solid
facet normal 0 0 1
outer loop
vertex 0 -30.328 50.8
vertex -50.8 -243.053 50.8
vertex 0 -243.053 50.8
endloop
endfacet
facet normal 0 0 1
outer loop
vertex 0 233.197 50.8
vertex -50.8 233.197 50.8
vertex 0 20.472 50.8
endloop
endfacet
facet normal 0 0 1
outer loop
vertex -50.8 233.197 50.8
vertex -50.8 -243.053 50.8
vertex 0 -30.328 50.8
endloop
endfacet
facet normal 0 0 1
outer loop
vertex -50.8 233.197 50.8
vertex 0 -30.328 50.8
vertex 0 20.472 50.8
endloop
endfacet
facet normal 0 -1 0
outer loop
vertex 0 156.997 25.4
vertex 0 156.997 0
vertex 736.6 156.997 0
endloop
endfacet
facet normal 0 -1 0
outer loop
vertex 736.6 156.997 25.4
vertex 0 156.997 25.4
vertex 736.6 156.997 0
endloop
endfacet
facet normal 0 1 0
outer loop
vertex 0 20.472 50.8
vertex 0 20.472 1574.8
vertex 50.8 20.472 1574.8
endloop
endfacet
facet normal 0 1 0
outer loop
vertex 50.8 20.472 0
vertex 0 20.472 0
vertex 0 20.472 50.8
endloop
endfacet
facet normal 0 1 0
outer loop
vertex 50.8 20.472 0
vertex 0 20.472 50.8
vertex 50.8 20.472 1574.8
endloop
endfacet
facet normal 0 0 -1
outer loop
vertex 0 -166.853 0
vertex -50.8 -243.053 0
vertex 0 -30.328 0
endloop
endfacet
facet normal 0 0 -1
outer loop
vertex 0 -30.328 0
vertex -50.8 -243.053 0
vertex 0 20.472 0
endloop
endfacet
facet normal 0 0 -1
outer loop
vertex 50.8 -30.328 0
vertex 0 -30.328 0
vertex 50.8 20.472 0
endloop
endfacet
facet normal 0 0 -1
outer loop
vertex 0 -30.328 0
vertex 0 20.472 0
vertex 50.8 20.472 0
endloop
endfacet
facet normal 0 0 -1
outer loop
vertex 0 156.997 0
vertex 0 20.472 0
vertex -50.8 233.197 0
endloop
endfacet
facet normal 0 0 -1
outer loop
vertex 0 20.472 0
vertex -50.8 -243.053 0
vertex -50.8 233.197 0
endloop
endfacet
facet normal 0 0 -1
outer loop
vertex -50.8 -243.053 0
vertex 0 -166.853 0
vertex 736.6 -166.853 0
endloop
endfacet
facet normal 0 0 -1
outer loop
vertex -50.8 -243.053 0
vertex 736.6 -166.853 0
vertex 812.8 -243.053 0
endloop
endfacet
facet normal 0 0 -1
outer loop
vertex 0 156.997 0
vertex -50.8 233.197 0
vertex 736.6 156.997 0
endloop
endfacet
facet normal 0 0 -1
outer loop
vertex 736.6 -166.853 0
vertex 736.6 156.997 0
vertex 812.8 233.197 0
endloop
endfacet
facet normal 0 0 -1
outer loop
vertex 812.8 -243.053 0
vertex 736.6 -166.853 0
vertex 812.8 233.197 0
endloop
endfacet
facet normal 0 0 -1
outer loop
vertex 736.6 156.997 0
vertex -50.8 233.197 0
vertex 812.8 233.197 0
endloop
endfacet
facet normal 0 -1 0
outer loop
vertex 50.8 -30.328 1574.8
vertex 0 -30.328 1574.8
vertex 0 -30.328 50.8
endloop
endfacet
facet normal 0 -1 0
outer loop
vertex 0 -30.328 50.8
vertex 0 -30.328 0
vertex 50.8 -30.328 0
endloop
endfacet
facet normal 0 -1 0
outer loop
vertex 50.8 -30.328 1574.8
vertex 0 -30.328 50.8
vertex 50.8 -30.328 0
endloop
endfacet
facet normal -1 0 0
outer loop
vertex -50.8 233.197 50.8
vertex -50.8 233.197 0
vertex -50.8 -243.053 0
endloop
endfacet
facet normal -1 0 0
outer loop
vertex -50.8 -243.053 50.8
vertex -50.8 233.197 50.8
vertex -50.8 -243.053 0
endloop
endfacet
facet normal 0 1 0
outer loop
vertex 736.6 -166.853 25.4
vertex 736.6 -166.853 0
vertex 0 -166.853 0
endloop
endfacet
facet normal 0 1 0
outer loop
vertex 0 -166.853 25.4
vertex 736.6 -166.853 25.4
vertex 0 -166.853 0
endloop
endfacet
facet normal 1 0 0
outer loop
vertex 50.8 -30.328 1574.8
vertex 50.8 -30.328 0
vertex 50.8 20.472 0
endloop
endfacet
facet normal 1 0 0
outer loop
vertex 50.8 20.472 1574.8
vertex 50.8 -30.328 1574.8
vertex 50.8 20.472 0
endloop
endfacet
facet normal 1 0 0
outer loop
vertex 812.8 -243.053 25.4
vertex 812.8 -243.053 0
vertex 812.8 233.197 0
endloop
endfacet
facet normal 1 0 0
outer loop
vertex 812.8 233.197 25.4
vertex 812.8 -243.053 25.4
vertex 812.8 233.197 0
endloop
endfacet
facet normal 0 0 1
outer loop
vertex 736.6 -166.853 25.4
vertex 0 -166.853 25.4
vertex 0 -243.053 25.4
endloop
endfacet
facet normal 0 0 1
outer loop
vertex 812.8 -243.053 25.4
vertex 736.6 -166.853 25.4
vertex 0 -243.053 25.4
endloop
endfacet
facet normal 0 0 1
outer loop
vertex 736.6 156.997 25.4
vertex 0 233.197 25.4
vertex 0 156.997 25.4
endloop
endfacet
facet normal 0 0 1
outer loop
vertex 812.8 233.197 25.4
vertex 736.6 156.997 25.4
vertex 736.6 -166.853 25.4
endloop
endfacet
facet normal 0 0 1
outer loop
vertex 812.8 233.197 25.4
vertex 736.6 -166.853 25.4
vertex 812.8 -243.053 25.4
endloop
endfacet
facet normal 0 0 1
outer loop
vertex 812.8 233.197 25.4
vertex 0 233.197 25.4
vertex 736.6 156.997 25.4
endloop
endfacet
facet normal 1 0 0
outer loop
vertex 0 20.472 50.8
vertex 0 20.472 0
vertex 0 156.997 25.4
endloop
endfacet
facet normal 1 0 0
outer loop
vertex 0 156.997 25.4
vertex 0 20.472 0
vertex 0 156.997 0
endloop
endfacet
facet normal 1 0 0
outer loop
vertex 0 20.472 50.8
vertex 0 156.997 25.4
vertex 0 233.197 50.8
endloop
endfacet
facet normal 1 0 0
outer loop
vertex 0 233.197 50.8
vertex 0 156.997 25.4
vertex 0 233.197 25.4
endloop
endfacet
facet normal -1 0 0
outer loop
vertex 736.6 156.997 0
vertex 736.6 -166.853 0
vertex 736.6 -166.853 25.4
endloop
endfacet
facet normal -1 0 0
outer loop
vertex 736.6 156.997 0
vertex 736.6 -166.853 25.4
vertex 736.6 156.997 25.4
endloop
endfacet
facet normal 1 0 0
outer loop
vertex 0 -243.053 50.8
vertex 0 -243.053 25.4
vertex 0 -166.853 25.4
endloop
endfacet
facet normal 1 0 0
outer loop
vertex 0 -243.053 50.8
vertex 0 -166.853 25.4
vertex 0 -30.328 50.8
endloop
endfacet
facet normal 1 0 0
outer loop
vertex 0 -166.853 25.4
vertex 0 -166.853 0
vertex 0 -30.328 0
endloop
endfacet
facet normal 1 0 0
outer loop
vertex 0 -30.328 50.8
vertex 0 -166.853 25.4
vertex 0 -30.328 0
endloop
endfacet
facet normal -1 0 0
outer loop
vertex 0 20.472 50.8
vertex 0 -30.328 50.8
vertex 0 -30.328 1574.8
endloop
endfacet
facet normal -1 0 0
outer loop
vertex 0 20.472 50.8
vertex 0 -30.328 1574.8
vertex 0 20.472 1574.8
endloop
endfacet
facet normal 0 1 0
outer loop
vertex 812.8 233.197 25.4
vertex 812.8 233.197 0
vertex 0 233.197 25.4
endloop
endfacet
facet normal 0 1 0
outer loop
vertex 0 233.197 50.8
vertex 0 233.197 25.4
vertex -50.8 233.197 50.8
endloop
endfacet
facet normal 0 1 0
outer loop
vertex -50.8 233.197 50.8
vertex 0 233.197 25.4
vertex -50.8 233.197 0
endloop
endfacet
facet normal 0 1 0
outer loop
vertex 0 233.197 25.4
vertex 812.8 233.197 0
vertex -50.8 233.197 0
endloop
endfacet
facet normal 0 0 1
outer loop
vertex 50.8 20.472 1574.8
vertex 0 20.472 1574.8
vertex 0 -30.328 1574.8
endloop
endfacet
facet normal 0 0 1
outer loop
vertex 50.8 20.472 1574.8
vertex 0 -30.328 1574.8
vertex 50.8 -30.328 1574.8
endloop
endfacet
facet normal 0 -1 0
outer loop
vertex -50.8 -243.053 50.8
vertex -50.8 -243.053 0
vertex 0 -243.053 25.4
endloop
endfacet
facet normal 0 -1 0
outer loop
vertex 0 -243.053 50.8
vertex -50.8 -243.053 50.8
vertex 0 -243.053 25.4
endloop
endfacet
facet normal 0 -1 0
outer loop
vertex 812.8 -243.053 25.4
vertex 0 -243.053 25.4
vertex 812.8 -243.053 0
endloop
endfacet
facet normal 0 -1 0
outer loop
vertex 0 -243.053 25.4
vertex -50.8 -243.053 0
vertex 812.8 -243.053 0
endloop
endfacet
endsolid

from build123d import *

# Parameters (mm, degrees)
F0_W     = 76.2
F0_H     = 323.85
F1_DEPTH = 25.4
F2_DEPTH = 50.8
F0_W_2   = 50.8
F0_H_2   = 50.8
F3_DEPTH = 1574.8


with BuildPart() as f1:
    # F0 (on Top) → F1 (new body)
    with BuildSketch(Plane.XY):
        Polygon((0, 233.196965), (0, 156.996965), (736.6, 156.996965), (812.8, 156.996965), (812.8, 233.196965), align=None)
        with Locations((774.7, -4.928035)):
            Rectangle(F0_W, F0_H)
        Polygon((812.8, -166.853035), (736.6, -166.853035), (0, -166.853035), (0, -243.053035), (812.8, -243.053035), align=None)
    extrude(amount=F1_DEPTH)

    # F0 (on Top) → F2 (join)
    with BuildSketch(Plane.XY):
        Polygon((0, 20.471965), (0, 156.996965), (0, 233.196965), (-50.8, 233.196965), (-50.8, -243.053035), (0, -243.053035), (0, -166.853035), (0, -30.328035), align=None)
    extrude(amount=F2_DEPTH)

    # F0 (on Top) → F3 (join)
    with BuildSketch(Plane.XY):
        with Locations((25.4, -4.928035)):
            Rectangle(F0_W_2, F0_H_2)
    extrude(amount=F3_DEPTH)


solid = f1.part
